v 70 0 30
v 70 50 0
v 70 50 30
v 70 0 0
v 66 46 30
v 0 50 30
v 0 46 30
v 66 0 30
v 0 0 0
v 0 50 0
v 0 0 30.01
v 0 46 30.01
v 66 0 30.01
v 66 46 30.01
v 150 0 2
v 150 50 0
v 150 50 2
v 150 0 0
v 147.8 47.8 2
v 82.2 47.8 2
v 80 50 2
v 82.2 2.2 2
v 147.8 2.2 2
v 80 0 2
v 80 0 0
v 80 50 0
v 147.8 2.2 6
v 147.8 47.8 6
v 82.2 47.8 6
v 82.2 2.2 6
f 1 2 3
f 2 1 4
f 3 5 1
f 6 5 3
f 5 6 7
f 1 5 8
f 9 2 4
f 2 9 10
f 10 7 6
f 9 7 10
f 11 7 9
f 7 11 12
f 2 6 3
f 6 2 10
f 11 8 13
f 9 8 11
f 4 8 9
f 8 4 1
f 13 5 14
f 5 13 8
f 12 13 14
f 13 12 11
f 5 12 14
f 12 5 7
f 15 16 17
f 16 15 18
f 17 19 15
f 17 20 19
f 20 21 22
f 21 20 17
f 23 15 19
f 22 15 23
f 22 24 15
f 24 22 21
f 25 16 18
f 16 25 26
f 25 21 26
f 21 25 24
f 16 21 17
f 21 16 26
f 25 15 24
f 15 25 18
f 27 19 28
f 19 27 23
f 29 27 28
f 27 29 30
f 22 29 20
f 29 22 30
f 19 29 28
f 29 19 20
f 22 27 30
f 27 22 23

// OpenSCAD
// --- Dimensions ---
// Box outer dimensions
BOX_W = 70;
BOX_D = 50;
BOX_H = 30;

// Box wall and floor thickness
WALL_THK = 2;
FLOOR_THK = 2;

// Lid plate dimensions (matches box outer footprint)
LID_W = 70;
LID_D = 50;
LID_PLATE_THK = 2;

// Lid lip dimensions (inner sliding part)
LIP_OUT_W = 65.6;
LIP_OUT_D = 45.6;
LIP_THK = 1.5;
LIP_H = 4;

// Spacing between parts
GAP = 10;

// --- Calculated Positions ---
// Box is centred at origin in X/Y
BOX_X = 0;
BOX_Y = 0;

// Lid is on the +X side, with GAP distance between them
// Box right edge is at BOX_W/2. Lid left edge is at BOX_W/2 + GAP.
// Lid centre X = (BOX_W/2 + GAP) + LID_W/2
LID_X = (BOX_W / 2) + GAP + (LID_W / 2);
LID_Y = 0; // Centred in Y

// --- Helper: Box Body ---
// Built on XY plane, builds up in +Z
module build_box() {
    $fn = 64;
    
    // 1. Main outer shell
    // Height includes floor and walls. 
    // We build a solid block of size BOX_W x BOX_D x BOX_H
    // Then subtract the inner cavity.
    union() {
        // Outer shell
        cube([BOX_W, BOX_D, BOX_H], center = false);
        
        // Inner cavity subtraction
        // Cavity starts at floor height (FLOOR_THK)
        // Cavity width/depth is reduced by 2 * WALL_THK
        // Cavity height is BOX_H - FLOOR_THK (open top)
        // We extend the cut slightly past the bottom face (z=0) to ensure clean boolean
        // The void should start just below the floor top surface (FLOOR_THK)
        // and extend slightly above the box top to clean the inner corner.
        translate([0, 0, FLOOR_THK - 0.01]) {
            cube([
                BOX_W - 2 * WALL_THK,
                BOX_D - 2 * WALL_THK,
                BOX_H - FLOOR_THK + 0.02 // Extend slightly past top to clean inner corner
            ], center = false);
        }
    }
}

// --- Helper: Lid Body ---
// Printed upside down: Plate lies on bed (z=0), Lip builds up from there.
// The lip is the part that slides into the box.
module build_lid() {
    $fn = 64;
    
    union() {
        // 1. The base plate
        // Lies on the bed, thickness LID_PLATE_THK
        cube([LID_W, LID_D, LID_PLATE_THK], center = false);
        
        // 2. The lip
        // Centred on the plate.
        // Outer dimensions: LIP_OUT_W x LIP_OUT_D
        // Height: LIP_H
        // Thickness: LIP_THK (implied by difference between outer and inner lip dimensions)
        // Since it's a "wall", we model it as a solid block of lip dimensions
        // sitting on the plate.
        translate([
            (LID_W - LIP_OUT_W) / 2,
            (LID_D - LIP_OUT_D) / 2,
            LID_PLATE_THK
        ]) {
            cube([LIP_OUT_W, LIP_OUT_D, LIP_H], center = false);
        }
    }
}

// --- Main Assembly ---
// Place parts side by side
translate([BOX_X, BOX_Y, 0]) {
    build_box();
}

translate([LID_X, LID_Y, 0]) {
    build_lid();
}
